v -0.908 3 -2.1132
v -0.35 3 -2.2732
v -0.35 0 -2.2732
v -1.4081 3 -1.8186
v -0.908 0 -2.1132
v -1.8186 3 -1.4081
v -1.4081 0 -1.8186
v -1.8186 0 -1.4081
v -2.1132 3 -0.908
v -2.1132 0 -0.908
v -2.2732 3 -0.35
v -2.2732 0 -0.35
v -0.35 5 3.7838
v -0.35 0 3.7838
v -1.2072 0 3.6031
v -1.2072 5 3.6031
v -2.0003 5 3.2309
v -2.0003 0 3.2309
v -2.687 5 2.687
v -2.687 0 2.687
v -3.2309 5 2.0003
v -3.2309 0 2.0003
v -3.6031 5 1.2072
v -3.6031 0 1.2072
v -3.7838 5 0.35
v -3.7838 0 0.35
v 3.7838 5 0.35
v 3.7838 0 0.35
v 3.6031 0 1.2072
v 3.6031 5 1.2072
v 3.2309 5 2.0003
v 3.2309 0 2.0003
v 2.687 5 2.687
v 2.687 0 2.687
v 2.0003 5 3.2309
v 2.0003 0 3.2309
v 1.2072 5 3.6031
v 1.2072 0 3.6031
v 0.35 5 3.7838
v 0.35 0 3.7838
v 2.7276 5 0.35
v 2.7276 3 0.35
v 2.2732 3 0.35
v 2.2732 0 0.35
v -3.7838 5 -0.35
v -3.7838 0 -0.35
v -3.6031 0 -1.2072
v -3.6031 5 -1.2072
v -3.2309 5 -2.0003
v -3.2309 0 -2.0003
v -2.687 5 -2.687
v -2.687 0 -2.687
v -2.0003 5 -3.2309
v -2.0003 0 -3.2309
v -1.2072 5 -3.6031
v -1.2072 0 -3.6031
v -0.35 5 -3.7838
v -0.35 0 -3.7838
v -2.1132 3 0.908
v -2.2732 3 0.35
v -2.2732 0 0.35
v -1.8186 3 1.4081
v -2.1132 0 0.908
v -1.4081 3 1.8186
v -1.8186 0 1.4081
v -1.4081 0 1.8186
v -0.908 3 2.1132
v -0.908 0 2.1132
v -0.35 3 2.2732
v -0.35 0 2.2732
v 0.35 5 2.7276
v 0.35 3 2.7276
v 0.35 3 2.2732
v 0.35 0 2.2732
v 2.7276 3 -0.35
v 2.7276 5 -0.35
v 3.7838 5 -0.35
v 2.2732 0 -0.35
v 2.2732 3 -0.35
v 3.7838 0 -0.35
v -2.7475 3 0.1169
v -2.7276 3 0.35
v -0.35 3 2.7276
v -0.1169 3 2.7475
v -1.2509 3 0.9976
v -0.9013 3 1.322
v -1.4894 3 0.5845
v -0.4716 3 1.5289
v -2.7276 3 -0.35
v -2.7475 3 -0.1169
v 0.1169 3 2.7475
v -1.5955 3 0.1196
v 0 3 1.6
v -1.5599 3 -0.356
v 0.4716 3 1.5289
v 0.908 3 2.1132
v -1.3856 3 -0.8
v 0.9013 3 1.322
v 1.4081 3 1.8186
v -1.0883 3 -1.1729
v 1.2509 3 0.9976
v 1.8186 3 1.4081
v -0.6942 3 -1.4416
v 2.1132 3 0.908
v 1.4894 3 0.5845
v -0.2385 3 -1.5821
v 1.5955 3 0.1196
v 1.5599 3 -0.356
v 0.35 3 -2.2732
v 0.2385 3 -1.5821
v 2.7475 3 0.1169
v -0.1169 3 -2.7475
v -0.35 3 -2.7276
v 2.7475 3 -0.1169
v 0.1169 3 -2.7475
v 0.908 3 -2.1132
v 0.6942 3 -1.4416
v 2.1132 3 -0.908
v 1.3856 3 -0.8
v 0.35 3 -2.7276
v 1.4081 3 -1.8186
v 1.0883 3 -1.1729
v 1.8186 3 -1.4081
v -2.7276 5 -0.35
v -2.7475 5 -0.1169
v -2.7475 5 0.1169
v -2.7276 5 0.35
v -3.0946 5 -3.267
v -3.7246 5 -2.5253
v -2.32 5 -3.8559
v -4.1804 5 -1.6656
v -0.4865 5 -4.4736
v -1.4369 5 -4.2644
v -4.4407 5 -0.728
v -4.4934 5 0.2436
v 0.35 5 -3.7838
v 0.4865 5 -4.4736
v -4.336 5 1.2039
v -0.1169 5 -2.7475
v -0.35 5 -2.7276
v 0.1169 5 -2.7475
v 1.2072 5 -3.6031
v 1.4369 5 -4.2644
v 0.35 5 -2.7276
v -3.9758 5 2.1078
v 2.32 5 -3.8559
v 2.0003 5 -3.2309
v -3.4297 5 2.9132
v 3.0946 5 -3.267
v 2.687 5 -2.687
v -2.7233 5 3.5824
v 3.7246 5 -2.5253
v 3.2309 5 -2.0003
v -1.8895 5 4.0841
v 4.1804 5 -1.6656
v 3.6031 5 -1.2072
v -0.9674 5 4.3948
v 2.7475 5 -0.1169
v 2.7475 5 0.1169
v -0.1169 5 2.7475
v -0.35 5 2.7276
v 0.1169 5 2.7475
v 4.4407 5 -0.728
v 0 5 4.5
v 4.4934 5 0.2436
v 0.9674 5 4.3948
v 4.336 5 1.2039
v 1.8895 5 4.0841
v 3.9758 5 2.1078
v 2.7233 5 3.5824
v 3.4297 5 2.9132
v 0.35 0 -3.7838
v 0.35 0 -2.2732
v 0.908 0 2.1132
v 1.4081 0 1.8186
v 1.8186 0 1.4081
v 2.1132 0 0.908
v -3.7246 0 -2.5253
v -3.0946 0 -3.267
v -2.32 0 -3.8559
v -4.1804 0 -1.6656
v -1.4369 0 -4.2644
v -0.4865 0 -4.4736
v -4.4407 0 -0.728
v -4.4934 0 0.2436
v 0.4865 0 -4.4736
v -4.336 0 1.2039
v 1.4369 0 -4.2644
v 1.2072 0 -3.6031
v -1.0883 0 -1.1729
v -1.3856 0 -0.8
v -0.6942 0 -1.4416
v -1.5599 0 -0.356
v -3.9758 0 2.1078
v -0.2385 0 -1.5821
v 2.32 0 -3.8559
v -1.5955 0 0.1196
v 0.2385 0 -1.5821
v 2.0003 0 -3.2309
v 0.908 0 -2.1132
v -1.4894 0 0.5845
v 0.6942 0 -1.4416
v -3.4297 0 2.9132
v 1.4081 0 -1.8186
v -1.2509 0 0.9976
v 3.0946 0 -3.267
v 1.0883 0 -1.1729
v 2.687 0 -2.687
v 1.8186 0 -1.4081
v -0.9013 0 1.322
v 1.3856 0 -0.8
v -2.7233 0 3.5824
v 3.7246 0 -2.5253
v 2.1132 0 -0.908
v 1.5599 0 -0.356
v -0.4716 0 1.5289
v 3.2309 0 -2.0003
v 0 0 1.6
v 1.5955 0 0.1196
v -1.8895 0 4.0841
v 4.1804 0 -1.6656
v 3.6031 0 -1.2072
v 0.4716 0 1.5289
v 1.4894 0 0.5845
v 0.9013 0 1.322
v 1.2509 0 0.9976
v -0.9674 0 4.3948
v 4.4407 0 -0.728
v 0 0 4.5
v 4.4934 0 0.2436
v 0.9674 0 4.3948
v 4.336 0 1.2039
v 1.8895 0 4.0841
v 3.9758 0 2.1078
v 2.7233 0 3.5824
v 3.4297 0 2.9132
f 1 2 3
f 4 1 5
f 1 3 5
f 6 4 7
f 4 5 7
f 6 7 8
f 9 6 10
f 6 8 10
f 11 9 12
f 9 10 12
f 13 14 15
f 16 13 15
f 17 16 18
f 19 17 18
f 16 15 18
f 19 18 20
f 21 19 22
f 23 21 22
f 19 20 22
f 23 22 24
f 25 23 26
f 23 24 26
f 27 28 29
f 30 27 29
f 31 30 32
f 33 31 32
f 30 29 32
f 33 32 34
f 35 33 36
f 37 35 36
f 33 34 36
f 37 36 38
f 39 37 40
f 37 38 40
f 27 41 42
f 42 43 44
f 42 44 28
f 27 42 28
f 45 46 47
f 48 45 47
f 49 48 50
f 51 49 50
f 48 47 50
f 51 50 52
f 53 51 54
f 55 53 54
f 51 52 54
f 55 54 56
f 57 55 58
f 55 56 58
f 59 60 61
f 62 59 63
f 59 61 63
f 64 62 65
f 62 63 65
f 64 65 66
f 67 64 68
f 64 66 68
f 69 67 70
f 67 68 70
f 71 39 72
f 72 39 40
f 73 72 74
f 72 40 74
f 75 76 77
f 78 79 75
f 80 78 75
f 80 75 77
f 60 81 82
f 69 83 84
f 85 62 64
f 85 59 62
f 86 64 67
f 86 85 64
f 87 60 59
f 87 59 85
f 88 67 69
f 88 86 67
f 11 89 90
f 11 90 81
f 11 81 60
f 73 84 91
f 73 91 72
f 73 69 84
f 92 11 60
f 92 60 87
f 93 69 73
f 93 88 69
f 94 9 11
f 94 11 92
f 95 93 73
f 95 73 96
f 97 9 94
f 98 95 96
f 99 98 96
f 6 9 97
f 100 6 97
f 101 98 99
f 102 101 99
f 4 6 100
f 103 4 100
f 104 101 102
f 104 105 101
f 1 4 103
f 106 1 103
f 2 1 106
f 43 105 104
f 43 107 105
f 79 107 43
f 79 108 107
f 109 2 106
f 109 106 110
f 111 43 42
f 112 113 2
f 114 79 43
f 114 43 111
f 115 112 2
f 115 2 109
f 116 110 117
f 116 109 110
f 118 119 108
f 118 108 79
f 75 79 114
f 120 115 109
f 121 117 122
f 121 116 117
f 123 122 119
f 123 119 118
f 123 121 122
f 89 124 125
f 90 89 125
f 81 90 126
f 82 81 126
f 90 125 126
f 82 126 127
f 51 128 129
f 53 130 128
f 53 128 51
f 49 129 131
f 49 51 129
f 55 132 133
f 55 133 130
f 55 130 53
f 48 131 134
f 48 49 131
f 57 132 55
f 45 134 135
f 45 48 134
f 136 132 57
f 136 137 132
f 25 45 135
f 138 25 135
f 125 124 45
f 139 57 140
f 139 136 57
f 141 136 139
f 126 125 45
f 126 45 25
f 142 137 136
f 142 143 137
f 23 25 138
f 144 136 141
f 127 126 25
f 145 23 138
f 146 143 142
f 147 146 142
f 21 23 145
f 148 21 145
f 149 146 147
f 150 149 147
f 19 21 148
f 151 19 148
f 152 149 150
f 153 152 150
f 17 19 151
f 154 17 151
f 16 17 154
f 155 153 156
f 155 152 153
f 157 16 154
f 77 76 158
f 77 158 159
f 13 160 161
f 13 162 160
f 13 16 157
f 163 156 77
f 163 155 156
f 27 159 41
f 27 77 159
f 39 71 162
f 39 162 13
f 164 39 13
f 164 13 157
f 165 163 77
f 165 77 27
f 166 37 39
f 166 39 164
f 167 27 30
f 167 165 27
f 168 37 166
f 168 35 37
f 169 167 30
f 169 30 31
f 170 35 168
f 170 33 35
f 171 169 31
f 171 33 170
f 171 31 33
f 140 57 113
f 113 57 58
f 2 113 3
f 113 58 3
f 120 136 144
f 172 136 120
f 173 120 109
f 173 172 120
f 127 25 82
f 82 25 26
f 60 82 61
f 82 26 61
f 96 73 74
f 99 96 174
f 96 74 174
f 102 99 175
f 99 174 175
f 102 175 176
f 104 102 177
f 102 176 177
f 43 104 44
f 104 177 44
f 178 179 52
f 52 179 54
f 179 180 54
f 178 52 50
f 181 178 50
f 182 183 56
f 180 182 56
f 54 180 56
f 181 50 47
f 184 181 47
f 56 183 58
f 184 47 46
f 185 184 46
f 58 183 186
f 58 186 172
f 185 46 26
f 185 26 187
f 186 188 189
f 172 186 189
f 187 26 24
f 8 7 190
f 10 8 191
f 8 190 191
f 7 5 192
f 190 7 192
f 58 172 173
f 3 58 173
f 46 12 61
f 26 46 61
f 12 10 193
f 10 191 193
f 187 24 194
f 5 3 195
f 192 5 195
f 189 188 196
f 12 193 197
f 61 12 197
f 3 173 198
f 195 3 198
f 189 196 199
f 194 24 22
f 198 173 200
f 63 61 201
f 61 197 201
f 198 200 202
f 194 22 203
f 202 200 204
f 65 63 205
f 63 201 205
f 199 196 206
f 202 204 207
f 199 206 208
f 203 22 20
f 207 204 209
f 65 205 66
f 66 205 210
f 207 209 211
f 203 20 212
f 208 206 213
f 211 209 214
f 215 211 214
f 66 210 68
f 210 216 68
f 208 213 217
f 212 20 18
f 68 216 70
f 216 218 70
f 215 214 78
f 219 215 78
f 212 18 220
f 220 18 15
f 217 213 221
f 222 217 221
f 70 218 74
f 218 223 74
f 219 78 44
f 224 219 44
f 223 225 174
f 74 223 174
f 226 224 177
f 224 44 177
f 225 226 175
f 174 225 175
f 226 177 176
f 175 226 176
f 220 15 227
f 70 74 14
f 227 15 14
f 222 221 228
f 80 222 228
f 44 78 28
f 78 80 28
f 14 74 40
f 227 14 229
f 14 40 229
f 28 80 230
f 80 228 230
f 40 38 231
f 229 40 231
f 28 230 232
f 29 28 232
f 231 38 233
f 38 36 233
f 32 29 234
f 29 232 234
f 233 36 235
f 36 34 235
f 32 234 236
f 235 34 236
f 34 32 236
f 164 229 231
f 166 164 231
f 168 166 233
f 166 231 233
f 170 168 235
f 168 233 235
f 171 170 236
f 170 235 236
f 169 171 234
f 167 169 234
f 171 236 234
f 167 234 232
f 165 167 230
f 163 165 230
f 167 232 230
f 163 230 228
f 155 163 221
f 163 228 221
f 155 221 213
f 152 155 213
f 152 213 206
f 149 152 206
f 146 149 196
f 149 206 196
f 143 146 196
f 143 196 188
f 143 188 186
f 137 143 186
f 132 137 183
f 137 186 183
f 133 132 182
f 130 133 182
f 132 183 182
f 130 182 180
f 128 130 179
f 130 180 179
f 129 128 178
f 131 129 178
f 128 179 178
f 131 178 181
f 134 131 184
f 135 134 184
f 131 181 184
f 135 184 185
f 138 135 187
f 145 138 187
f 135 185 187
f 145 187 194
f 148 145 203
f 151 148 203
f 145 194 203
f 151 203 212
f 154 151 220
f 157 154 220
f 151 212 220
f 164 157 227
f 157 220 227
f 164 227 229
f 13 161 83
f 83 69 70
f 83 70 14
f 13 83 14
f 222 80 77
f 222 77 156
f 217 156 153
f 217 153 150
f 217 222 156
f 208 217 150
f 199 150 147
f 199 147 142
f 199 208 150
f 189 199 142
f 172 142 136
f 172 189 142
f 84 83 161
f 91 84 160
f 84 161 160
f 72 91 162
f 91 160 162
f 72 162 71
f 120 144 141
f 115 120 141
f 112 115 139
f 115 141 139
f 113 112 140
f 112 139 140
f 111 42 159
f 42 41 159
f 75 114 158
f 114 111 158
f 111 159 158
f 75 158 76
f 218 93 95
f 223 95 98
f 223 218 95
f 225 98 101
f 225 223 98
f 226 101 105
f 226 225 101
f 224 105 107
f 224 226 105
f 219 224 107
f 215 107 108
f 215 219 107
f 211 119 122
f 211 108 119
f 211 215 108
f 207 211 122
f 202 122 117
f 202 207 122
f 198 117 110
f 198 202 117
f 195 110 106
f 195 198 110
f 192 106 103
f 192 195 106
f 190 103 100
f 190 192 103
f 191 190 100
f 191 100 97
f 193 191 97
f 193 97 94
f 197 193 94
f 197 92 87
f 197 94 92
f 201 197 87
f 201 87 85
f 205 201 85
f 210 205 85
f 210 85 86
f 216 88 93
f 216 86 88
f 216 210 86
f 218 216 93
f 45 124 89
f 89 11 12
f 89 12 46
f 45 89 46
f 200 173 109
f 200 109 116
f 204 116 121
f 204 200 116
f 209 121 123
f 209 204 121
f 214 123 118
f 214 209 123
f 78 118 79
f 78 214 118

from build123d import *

# Parameters (mm, degrees)
SKETCH_1_R          = 4.5
SKETCH_1_R_2        = 1.6
EXTRUDE_1_DEPTH     = 5
SKETCH_2_R          = 2.75
CUT_EXTRUDE_1_DEPTH = 2


with BuildPart() as part:
    # 草图1 → 凸台-拉伸1 (new body)
    with BuildSketch(Plane(origin=(0, 0, 0), x_dir=(1, 0, 0), z_dir=(0, 1, 0))):
        with Locations(Location((0, 0, 0), (0, 0, 270))):
            Circle(SKETCH_1_R)
        with Locations(Location((0, 0, 0), (0, 0, 270))):
            Circle(SKETCH_1_R_2, mode=Mode.SUBTRACT)
        with BuildLine():
            Line((2.273213584, 0.35), (3.783847249, 0.35))
            ThreePointArc((3.783847249, 0.35), (2.687005769, 2.687005769), (0.35, 3.783847249))
            Line((0.35, 3.783847249), (0.35, 2.273213584))
            ThreePointArc((0.35, 2.273213584), (1.626345597, 1.626345597), (2.273213584, 0.35))
        make_face(mode=Mode.SUBTRACT)
        with BuildLine():
            Line((2.273213584, -0.35), (3.783847249, -0.35))
            ThreePointArc((3.783847249, -0.35), (2.687005769, -2.687005769), (0.35, -3.783847249))
            Line((0.35, -3.783847249), (0.35, -2.273213584))
            ThreePointArc((0.35, -2.273213584), (1.626345597, -1.626345597), (2.273213584, -0.35))
        make_face(mode=Mode.SUBTRACT)
        with BuildLine():
            Line((-0.35, -2.273213584), (-0.35, -3.783847249))
            ThreePointArc((-0.35, -3.783847249), (-2.687005769, -2.687005769), (-3.783847249, -0.35))
            Line((-3.783847249, -0.35), (-2.273213584, -0.35))
            ThreePointArc((-2.273213584, -0.35), (-1.626345597, -1.626345597), (-0.35, -2.273213584))
        make_face(mode=Mode.SUBTRACT)
        with BuildLine():
            Line((-2.273213584, 0.35), (-3.783847249, 0.35))
            ThreePointArc((-3.783847249, 0.35), (-2.687005769, 2.687005769), (-0.35, 3.783847249))
            Line((-0.35, 3.783847249), (-0.35, 2.273213584))
            ThreePointArc((-0.35, 2.273213584), (-1.626345597, 1.626345597), (-2.273213584, 0.35))
        make_face(mode=Mode.SUBTRACT)
    extrude(amount=EXTRUDE_1_DEPTH)

    # 草图2 → 切除-拉伸1 (cut)
    with BuildSketch(Plane(origin=(0, 5, 0), x_dir=(1, 0, 0), z_dir=(0, 1, 0))):
        Circle(SKETCH_2_R)
    extrude(amount=-CUT_EXTRUDE_1_DEPTH, mode=Mode.SUBTRACT)


solid = part.part
